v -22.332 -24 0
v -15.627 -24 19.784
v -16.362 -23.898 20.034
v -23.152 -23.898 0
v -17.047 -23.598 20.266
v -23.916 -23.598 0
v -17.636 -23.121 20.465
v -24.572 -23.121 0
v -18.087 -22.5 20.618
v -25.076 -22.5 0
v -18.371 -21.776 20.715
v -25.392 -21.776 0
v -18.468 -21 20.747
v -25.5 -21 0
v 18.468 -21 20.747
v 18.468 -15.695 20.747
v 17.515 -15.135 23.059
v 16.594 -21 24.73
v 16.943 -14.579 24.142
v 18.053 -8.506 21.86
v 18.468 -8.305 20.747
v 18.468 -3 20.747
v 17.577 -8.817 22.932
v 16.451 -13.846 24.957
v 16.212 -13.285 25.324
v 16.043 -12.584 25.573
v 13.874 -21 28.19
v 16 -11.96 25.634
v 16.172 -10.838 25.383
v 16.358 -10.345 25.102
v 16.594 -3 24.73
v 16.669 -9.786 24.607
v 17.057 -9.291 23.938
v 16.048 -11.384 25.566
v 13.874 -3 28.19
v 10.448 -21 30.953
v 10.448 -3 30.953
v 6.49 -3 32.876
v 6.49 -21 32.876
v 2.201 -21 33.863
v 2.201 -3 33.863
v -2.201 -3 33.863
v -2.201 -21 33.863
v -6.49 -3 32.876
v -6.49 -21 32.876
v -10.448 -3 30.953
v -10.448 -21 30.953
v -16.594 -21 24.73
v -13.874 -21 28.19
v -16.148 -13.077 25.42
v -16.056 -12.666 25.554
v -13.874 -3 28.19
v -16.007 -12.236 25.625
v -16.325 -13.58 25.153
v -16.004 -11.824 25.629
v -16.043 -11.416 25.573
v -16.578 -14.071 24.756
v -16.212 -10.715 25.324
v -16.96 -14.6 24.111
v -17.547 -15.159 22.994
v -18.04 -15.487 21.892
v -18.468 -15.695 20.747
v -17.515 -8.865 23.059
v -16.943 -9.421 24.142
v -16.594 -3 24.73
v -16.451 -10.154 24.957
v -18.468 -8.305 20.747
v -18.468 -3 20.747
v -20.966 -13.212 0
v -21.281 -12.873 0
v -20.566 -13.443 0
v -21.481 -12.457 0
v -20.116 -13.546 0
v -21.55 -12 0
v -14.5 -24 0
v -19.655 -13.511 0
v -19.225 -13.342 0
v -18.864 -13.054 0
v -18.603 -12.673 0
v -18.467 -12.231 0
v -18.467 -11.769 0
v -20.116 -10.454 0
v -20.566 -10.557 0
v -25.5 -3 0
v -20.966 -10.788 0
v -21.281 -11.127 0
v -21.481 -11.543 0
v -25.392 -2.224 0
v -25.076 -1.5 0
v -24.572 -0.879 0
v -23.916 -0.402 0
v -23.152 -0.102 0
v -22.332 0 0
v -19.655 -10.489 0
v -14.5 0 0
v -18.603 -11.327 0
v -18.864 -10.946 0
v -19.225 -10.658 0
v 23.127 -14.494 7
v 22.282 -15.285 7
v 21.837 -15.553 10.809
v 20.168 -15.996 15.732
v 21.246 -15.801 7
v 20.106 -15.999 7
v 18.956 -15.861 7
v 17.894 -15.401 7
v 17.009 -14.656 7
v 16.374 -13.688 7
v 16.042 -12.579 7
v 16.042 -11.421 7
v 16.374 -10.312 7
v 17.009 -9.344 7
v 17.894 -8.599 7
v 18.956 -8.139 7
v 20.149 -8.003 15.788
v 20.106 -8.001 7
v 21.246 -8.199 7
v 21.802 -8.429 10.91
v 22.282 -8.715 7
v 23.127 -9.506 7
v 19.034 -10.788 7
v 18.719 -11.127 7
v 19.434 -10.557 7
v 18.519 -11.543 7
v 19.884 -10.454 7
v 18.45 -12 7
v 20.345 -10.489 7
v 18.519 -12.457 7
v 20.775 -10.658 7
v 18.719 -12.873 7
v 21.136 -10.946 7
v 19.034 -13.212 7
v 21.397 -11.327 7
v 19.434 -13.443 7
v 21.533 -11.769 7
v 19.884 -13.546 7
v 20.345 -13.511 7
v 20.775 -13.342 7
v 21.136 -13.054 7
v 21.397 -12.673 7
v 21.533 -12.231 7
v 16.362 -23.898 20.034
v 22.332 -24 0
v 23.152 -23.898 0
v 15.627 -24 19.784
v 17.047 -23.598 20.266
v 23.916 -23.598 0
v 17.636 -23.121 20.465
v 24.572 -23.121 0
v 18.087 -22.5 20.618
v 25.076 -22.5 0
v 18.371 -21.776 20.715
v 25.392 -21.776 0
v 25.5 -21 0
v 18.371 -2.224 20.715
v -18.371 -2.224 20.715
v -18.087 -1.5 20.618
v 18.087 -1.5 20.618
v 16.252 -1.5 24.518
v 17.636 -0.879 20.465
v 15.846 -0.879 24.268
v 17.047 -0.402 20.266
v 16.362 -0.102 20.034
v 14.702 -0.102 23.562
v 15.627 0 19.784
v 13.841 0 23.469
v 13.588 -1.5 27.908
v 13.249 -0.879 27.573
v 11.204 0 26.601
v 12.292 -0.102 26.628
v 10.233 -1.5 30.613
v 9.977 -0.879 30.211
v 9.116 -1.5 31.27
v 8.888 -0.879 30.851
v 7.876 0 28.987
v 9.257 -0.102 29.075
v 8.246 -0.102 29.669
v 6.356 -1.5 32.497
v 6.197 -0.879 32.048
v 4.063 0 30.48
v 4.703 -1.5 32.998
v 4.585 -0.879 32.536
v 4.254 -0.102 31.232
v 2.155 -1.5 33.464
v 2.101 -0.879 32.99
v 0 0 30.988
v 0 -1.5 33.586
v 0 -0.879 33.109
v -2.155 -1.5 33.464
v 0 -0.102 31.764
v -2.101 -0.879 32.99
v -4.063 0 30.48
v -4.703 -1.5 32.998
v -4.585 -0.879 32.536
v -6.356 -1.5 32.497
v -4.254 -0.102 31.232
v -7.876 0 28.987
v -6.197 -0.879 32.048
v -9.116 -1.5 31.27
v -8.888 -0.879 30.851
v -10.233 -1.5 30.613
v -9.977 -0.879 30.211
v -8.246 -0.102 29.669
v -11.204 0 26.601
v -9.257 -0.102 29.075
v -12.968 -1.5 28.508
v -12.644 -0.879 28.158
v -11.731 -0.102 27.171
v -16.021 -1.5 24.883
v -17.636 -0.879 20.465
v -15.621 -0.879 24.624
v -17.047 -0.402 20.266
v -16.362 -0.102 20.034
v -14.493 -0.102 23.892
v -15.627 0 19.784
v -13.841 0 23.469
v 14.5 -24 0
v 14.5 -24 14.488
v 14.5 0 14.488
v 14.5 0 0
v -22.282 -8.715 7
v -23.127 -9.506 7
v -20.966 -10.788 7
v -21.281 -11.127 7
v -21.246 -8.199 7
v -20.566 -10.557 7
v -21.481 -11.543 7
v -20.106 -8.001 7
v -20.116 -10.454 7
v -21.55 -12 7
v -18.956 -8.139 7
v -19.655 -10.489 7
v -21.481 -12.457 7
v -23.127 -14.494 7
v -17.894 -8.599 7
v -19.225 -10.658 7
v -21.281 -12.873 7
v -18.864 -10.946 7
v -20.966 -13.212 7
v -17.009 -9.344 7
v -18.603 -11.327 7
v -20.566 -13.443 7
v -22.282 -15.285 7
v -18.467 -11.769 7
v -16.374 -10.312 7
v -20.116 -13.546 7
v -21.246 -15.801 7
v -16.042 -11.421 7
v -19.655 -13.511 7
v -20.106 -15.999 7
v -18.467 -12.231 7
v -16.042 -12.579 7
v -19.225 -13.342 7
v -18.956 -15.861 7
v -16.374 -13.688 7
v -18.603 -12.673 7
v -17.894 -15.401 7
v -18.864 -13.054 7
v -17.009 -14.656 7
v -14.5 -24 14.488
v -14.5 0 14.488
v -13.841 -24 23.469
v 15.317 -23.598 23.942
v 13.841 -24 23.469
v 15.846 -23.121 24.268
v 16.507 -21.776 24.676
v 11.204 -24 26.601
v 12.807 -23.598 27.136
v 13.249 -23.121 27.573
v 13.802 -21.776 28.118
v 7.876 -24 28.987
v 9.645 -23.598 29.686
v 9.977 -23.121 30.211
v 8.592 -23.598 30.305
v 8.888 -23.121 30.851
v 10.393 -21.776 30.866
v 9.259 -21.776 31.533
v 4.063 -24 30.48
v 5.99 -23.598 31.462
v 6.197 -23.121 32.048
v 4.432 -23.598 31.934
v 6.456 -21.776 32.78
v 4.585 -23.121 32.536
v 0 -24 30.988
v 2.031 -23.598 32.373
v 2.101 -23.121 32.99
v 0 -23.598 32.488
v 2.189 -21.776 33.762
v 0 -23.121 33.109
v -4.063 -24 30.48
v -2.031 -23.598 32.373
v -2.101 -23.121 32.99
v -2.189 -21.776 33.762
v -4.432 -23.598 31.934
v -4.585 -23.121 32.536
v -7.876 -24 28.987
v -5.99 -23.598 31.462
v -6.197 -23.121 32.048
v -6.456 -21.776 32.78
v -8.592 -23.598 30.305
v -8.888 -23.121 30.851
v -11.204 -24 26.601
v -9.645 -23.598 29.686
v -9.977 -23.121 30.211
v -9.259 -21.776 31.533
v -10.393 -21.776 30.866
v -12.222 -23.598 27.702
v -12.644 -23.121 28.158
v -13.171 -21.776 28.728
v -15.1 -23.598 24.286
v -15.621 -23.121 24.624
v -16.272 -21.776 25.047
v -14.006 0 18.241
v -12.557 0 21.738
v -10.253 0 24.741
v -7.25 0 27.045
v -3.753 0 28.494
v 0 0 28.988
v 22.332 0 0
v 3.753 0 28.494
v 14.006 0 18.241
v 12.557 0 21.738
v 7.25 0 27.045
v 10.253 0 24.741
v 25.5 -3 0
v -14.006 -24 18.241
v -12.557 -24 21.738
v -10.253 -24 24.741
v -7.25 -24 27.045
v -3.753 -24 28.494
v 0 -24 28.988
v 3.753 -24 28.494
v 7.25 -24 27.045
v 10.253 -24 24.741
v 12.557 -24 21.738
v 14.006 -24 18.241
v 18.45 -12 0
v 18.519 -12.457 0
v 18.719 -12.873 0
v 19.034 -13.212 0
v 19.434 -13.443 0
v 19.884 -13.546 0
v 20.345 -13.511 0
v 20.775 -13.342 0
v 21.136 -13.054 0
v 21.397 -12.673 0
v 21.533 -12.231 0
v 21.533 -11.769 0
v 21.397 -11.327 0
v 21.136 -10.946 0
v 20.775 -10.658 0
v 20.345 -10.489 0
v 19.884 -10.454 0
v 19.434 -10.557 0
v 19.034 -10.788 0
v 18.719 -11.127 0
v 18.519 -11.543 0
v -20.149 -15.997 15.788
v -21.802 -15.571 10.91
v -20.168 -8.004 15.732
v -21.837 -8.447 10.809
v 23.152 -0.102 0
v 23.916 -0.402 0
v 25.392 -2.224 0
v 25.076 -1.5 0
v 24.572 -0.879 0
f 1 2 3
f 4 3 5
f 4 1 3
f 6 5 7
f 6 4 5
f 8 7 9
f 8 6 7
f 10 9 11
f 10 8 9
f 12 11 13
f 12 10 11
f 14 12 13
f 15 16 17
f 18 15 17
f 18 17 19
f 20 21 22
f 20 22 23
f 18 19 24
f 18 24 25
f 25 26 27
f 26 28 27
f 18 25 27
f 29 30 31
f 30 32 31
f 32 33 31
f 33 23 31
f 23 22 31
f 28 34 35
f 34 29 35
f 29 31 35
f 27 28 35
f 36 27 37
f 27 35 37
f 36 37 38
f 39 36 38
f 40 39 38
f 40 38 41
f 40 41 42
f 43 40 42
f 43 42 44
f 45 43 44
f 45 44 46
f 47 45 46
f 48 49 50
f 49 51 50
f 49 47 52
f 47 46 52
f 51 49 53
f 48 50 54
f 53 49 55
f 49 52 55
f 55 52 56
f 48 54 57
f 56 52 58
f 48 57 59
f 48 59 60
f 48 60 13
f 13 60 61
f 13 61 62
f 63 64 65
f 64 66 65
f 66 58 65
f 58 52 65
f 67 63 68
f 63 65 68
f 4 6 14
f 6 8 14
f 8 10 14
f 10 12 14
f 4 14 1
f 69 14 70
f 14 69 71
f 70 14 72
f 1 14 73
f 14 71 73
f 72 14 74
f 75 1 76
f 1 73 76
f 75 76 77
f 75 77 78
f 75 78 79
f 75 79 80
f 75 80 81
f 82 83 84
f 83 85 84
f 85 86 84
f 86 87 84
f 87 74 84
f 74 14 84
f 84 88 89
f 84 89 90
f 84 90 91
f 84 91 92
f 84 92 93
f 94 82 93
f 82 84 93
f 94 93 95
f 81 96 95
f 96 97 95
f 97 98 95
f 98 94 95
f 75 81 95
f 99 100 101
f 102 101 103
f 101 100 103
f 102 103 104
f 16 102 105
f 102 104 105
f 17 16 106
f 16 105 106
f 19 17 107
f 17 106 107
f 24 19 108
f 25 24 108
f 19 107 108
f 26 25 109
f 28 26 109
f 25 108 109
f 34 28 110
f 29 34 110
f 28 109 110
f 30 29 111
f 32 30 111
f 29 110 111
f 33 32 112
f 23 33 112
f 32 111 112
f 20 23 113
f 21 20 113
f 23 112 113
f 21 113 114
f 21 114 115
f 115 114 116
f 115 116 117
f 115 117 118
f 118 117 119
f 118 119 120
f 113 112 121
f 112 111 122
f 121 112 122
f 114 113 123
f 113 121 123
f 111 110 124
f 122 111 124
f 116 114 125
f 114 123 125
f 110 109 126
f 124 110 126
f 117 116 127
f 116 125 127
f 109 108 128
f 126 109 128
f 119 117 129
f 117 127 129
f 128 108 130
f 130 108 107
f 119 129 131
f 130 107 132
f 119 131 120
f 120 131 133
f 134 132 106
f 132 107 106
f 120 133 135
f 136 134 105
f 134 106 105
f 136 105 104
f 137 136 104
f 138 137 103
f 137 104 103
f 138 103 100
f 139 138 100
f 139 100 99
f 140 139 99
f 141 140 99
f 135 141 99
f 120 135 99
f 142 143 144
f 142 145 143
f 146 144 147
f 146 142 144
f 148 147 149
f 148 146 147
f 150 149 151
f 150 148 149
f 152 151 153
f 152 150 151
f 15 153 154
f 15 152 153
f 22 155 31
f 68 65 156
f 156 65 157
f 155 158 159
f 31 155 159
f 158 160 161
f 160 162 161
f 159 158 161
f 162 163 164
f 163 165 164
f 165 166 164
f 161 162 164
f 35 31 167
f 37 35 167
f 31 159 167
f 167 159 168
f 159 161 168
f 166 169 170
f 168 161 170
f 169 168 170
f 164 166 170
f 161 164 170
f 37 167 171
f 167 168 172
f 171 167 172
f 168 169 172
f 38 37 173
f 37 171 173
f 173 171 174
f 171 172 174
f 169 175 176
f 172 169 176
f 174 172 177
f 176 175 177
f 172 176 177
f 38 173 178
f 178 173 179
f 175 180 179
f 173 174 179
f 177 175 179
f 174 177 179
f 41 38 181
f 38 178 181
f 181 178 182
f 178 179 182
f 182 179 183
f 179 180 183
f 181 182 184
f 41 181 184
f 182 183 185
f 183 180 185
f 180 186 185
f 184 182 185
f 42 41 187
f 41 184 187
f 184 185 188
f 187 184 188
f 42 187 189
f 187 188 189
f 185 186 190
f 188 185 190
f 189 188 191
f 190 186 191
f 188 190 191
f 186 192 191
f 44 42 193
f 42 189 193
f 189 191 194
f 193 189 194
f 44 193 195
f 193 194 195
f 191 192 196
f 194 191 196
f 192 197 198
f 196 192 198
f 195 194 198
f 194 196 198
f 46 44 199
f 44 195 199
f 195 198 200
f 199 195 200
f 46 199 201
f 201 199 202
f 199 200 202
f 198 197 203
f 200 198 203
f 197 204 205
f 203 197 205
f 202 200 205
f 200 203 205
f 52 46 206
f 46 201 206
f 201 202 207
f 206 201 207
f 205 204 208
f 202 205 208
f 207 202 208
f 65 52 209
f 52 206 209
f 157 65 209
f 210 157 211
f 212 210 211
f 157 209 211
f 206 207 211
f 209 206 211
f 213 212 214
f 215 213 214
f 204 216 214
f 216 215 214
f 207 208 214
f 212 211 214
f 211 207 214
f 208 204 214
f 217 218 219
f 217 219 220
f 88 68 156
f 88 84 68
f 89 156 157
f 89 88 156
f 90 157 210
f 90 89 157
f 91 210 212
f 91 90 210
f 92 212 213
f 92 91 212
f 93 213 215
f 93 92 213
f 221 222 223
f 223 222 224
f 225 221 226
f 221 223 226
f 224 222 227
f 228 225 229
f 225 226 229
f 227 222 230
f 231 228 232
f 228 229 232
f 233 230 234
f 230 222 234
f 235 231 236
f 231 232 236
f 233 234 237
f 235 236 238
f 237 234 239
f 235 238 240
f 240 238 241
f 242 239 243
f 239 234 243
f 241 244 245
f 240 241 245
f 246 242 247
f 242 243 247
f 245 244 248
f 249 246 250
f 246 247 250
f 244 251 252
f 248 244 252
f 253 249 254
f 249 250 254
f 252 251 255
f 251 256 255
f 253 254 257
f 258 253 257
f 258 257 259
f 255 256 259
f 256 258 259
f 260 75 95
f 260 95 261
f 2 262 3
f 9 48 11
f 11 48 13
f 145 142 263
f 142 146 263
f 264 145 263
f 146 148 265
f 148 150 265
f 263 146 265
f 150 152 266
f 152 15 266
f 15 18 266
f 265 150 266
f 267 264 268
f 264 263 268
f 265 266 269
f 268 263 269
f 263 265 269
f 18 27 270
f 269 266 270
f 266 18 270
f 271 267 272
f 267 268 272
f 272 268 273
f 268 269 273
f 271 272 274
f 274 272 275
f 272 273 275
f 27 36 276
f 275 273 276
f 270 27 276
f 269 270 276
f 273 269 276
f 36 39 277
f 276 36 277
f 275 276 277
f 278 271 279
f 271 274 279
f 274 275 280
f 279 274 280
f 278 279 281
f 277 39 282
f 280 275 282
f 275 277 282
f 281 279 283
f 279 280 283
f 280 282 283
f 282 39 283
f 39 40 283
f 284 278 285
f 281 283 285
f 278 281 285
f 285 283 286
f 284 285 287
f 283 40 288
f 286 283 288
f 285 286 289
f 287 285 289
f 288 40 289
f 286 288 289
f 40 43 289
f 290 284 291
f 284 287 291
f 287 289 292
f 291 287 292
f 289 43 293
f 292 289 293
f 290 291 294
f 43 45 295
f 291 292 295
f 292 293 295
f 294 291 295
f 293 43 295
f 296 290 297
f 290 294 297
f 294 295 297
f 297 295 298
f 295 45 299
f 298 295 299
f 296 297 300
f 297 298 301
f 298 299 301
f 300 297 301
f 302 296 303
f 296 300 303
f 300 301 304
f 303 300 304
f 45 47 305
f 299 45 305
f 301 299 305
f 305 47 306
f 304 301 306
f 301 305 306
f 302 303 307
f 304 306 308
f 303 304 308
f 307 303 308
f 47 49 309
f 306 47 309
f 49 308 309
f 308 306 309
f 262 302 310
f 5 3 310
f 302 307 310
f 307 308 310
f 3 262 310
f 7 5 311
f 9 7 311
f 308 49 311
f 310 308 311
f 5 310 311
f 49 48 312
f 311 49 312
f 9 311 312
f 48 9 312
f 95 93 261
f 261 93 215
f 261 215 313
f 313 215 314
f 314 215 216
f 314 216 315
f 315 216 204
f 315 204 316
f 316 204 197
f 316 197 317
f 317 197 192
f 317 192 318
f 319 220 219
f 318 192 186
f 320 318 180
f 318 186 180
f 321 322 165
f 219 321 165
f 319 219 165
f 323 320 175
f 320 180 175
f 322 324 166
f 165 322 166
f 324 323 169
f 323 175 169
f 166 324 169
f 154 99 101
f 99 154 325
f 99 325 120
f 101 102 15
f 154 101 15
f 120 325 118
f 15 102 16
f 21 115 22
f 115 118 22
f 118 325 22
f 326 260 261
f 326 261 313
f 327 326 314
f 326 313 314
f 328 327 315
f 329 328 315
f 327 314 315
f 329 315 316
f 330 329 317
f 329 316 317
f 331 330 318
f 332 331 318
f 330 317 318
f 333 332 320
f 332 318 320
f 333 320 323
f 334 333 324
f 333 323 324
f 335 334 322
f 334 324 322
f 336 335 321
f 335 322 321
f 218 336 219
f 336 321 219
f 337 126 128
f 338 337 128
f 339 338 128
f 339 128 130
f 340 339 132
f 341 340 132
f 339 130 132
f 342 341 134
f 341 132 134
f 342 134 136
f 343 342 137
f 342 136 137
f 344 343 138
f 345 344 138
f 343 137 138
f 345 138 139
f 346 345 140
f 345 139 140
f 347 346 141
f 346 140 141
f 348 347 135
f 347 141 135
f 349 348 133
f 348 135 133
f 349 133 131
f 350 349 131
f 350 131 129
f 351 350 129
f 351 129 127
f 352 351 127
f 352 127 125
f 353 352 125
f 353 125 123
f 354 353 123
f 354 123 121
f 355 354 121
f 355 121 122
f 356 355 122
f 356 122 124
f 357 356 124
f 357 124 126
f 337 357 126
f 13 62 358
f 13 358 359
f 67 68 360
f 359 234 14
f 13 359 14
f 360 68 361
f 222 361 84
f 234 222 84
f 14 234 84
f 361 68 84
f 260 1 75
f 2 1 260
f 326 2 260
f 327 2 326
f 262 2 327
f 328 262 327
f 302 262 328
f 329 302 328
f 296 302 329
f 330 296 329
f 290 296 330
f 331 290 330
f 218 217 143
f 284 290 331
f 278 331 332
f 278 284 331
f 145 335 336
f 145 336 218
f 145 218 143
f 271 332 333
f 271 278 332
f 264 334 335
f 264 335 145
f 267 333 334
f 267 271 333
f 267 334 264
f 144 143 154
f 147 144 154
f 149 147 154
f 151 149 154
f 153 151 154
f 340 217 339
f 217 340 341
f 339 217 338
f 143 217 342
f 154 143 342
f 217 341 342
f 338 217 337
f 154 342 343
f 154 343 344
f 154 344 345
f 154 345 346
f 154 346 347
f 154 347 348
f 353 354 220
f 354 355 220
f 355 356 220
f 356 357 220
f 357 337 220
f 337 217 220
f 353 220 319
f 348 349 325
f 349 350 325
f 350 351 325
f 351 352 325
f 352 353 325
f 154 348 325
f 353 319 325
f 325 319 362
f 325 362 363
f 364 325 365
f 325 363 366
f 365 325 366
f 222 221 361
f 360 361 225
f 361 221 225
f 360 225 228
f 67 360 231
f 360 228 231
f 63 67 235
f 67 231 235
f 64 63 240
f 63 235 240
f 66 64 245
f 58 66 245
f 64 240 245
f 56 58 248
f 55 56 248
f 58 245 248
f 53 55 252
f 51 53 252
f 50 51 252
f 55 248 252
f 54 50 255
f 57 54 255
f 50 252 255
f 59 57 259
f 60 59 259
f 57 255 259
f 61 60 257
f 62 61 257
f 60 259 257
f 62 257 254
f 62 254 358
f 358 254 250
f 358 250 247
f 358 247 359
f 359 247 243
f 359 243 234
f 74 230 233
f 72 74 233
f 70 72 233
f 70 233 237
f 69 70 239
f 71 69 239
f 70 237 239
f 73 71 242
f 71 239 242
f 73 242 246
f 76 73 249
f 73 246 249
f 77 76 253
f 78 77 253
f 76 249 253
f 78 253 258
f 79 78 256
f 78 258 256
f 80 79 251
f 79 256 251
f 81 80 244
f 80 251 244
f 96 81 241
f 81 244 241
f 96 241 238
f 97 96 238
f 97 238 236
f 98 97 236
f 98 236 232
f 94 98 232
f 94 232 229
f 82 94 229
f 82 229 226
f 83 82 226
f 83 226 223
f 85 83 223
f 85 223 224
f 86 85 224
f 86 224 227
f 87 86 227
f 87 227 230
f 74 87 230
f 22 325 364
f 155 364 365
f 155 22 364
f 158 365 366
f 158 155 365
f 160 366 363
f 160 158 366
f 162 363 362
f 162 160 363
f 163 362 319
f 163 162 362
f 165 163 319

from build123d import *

# Parameters (mm, degrees)
F1_DEPTH = 24
F3_D     = 3.1
F6_D     = 8
F6_DEPTH = 26.9889453037
F7_R     = 3


with BuildPart() as f1:
    # F0 (on Front) → F1 (new body)
    with BuildSketch(Plane.XZ):
        with BuildLine():
            ThreePointArc((-14.5, 14.4879452037), (0, 28.9879452037), (14.5, 14.4879452037))
            Line((14.5, 14.4879452037), (14.5, 0))
            Line((14.5, 0), (25.5, 0))
            Line((25.5, 0), (18.4680759907, 20.7473516612))
            ThreePointArc((18.4680759907, 20.7473516612), (0, 33.9879452037), (-18.4680759907, 20.7473516612))
            Line((-18.4680759907, 20.7473516612), (-25.5, 0))
            Line((-25.5, 0), (-14.5, 0))
            Line((-14.5, 0), (-14.5, 14.4879452037))
        make_face()
    extrude(amount=F1_DEPTH)

    # F3 (through all)
    with Locations(Plane(origin=(0, 0, 0), x_dir=(1, 0, 0), z_dir=(0, 0, -1))):
        with Locations((-20, 12), (20, 12)):
            Hole(F3_D / 2)

    # F6 (through all, one way)
    with BuildSketch(Plane(origin=(0, 0, 7), x_dir=(1, 0, 0), z_dir=(0, 0, -1))):
        with Locations((-20, 12), (20, 12)):
            Circle(F6_D / 2)
    extrude(amount=-F6_DEPTH, mode=Mode.SUBTRACT)

    # F7
    f7_edges = [f1.edges().sort_by_distance(p)[0] for p in [
        (0, 0, 33.987945),
        (0, -24, 33.987945),
    ]]
    fillet(f7_edges, radius=F7_R)


solid = f1.part
